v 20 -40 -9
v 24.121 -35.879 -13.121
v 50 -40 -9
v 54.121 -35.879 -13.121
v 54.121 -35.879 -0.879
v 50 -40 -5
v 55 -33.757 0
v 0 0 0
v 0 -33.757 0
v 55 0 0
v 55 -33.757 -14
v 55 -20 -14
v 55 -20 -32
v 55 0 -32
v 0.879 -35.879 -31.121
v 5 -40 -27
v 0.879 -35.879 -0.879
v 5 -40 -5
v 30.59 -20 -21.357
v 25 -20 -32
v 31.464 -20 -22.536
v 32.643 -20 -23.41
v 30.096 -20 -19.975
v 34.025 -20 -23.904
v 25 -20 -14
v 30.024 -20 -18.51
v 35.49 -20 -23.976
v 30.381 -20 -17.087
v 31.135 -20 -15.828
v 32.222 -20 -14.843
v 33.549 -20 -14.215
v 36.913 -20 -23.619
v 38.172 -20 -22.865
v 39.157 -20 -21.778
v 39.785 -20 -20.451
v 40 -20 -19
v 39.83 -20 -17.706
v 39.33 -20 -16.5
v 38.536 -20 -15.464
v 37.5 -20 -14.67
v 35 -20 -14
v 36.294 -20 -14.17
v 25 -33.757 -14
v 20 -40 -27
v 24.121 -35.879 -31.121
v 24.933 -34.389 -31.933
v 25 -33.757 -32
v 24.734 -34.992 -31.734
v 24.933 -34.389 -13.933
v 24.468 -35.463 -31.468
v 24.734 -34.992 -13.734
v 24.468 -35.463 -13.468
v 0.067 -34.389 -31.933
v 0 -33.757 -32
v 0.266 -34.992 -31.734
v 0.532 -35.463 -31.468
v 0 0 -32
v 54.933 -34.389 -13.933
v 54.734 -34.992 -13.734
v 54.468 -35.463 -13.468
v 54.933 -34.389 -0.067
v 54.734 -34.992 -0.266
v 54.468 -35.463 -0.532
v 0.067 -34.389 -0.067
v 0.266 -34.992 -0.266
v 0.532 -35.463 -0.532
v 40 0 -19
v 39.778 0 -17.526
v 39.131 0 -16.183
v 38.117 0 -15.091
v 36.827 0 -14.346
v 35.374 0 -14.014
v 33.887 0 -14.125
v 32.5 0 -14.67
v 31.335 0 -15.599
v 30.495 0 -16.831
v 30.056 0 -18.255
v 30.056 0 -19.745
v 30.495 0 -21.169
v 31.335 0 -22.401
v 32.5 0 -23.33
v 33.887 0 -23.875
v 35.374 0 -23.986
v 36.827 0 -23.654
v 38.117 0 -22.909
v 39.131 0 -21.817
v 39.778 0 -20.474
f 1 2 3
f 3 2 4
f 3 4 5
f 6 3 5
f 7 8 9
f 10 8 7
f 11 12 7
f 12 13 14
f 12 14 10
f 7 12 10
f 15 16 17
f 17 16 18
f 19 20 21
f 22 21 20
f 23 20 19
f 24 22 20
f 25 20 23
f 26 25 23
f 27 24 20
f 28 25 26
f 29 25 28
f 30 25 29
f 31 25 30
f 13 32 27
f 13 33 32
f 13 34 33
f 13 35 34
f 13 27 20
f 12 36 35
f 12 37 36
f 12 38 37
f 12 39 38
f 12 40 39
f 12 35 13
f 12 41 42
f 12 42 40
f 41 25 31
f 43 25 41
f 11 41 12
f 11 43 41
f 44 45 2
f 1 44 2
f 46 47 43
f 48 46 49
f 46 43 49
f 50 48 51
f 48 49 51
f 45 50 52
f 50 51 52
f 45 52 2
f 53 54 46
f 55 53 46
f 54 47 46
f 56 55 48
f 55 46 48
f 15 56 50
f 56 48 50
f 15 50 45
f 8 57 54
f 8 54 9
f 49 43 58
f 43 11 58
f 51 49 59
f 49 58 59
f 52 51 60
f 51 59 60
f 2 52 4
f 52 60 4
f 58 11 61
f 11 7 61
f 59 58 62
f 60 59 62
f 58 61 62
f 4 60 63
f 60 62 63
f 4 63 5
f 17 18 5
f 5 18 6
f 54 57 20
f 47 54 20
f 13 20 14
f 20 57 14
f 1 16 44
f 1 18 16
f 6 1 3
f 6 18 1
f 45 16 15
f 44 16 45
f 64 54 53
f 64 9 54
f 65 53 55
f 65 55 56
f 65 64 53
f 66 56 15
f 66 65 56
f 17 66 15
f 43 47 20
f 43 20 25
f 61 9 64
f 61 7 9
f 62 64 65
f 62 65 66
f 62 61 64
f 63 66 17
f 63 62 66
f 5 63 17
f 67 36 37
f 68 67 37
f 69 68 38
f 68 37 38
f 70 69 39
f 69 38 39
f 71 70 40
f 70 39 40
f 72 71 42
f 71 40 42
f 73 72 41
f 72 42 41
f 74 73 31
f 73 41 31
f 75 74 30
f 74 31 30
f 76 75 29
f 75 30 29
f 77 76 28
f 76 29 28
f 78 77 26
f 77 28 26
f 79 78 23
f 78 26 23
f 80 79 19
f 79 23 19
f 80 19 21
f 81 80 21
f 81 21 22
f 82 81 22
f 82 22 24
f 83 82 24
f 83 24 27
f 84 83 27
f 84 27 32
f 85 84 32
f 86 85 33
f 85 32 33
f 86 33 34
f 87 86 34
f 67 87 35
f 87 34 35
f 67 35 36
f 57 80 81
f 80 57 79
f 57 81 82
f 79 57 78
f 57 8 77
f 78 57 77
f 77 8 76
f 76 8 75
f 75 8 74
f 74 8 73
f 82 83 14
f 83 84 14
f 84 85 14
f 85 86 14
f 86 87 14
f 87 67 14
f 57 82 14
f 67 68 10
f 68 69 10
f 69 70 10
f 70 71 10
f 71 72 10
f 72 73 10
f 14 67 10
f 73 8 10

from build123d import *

# Parameters (mm, degrees)
F0_W     = 55
F0_H     = 32
F1_DEPTH = 40
F2_W     = 30
F2_H     = 18
F3_DEPTH = 20
F4_W     = 30
F4_H     = 18
F5_DEPTH = 20
F6_R     = 5
F7_DEPTH = 20.001
F8_SIZE  = 5
F9_R     = 3


with BuildPart() as f1:
    # F0 (on Front) → F1 (new body)
    with BuildSketch(Plane.XZ):
        with Locations((27.5, -16)):
            Rectangle(F0_W, F0_H)
    extrude(amount=F1_DEPTH)

    # F2 (on Front) → F3 (cut)
    with BuildSketch(Plane.XZ):
        with Locations((35.8558194712, -20.2440911922)):
            Rectangle(F2_W, F2_H)
    extrude(amount=-F3_DEPTH, mode=Mode.SUBTRACT)

    # F4 (on face) → F5 (cut)
    with BuildSketch(Plane.XZ.offset(40)):
        with Locations((40, -23)):
            Rectangle(F4_W, F4_H)
    extrude(amount=-F5_DEPTH, mode=Mode.SUBTRACT)

    # F6 (on face) → F7 (cut, through all)
    with BuildSketch(Plane.XZ.offset(20)):
        with Locations((35, -19)):
            Circle(F6_R)
    extrude(amount=-F7_DEPTH, mode=Mode.SUBTRACT)

    # F8
    f8_edges = [f1.edges().sort_by_distance(p)[0] for p in [
        (12.5, -40, -32),
        (25, -40, -23),
        (40, -40, -14),
        (55, -40, -7),
        (0, -40, -16),
        (27.5, -40, 0),
    ]]
    chamfer(f8_edges, length=F8_SIZE)

    # F9
    f9_edges = [f1.edges().sort_by_distance(p)[0] for p in [
        (0, -35, -16),
        (12.5, -35, -32),
        (25, -35, -23),
        (40, -35, -14),
        (55, -35, -7),
        (27.5, -35, 0),
    ]]
    fillet(f9_edges, radius=F9_R)


solid = f1.part
